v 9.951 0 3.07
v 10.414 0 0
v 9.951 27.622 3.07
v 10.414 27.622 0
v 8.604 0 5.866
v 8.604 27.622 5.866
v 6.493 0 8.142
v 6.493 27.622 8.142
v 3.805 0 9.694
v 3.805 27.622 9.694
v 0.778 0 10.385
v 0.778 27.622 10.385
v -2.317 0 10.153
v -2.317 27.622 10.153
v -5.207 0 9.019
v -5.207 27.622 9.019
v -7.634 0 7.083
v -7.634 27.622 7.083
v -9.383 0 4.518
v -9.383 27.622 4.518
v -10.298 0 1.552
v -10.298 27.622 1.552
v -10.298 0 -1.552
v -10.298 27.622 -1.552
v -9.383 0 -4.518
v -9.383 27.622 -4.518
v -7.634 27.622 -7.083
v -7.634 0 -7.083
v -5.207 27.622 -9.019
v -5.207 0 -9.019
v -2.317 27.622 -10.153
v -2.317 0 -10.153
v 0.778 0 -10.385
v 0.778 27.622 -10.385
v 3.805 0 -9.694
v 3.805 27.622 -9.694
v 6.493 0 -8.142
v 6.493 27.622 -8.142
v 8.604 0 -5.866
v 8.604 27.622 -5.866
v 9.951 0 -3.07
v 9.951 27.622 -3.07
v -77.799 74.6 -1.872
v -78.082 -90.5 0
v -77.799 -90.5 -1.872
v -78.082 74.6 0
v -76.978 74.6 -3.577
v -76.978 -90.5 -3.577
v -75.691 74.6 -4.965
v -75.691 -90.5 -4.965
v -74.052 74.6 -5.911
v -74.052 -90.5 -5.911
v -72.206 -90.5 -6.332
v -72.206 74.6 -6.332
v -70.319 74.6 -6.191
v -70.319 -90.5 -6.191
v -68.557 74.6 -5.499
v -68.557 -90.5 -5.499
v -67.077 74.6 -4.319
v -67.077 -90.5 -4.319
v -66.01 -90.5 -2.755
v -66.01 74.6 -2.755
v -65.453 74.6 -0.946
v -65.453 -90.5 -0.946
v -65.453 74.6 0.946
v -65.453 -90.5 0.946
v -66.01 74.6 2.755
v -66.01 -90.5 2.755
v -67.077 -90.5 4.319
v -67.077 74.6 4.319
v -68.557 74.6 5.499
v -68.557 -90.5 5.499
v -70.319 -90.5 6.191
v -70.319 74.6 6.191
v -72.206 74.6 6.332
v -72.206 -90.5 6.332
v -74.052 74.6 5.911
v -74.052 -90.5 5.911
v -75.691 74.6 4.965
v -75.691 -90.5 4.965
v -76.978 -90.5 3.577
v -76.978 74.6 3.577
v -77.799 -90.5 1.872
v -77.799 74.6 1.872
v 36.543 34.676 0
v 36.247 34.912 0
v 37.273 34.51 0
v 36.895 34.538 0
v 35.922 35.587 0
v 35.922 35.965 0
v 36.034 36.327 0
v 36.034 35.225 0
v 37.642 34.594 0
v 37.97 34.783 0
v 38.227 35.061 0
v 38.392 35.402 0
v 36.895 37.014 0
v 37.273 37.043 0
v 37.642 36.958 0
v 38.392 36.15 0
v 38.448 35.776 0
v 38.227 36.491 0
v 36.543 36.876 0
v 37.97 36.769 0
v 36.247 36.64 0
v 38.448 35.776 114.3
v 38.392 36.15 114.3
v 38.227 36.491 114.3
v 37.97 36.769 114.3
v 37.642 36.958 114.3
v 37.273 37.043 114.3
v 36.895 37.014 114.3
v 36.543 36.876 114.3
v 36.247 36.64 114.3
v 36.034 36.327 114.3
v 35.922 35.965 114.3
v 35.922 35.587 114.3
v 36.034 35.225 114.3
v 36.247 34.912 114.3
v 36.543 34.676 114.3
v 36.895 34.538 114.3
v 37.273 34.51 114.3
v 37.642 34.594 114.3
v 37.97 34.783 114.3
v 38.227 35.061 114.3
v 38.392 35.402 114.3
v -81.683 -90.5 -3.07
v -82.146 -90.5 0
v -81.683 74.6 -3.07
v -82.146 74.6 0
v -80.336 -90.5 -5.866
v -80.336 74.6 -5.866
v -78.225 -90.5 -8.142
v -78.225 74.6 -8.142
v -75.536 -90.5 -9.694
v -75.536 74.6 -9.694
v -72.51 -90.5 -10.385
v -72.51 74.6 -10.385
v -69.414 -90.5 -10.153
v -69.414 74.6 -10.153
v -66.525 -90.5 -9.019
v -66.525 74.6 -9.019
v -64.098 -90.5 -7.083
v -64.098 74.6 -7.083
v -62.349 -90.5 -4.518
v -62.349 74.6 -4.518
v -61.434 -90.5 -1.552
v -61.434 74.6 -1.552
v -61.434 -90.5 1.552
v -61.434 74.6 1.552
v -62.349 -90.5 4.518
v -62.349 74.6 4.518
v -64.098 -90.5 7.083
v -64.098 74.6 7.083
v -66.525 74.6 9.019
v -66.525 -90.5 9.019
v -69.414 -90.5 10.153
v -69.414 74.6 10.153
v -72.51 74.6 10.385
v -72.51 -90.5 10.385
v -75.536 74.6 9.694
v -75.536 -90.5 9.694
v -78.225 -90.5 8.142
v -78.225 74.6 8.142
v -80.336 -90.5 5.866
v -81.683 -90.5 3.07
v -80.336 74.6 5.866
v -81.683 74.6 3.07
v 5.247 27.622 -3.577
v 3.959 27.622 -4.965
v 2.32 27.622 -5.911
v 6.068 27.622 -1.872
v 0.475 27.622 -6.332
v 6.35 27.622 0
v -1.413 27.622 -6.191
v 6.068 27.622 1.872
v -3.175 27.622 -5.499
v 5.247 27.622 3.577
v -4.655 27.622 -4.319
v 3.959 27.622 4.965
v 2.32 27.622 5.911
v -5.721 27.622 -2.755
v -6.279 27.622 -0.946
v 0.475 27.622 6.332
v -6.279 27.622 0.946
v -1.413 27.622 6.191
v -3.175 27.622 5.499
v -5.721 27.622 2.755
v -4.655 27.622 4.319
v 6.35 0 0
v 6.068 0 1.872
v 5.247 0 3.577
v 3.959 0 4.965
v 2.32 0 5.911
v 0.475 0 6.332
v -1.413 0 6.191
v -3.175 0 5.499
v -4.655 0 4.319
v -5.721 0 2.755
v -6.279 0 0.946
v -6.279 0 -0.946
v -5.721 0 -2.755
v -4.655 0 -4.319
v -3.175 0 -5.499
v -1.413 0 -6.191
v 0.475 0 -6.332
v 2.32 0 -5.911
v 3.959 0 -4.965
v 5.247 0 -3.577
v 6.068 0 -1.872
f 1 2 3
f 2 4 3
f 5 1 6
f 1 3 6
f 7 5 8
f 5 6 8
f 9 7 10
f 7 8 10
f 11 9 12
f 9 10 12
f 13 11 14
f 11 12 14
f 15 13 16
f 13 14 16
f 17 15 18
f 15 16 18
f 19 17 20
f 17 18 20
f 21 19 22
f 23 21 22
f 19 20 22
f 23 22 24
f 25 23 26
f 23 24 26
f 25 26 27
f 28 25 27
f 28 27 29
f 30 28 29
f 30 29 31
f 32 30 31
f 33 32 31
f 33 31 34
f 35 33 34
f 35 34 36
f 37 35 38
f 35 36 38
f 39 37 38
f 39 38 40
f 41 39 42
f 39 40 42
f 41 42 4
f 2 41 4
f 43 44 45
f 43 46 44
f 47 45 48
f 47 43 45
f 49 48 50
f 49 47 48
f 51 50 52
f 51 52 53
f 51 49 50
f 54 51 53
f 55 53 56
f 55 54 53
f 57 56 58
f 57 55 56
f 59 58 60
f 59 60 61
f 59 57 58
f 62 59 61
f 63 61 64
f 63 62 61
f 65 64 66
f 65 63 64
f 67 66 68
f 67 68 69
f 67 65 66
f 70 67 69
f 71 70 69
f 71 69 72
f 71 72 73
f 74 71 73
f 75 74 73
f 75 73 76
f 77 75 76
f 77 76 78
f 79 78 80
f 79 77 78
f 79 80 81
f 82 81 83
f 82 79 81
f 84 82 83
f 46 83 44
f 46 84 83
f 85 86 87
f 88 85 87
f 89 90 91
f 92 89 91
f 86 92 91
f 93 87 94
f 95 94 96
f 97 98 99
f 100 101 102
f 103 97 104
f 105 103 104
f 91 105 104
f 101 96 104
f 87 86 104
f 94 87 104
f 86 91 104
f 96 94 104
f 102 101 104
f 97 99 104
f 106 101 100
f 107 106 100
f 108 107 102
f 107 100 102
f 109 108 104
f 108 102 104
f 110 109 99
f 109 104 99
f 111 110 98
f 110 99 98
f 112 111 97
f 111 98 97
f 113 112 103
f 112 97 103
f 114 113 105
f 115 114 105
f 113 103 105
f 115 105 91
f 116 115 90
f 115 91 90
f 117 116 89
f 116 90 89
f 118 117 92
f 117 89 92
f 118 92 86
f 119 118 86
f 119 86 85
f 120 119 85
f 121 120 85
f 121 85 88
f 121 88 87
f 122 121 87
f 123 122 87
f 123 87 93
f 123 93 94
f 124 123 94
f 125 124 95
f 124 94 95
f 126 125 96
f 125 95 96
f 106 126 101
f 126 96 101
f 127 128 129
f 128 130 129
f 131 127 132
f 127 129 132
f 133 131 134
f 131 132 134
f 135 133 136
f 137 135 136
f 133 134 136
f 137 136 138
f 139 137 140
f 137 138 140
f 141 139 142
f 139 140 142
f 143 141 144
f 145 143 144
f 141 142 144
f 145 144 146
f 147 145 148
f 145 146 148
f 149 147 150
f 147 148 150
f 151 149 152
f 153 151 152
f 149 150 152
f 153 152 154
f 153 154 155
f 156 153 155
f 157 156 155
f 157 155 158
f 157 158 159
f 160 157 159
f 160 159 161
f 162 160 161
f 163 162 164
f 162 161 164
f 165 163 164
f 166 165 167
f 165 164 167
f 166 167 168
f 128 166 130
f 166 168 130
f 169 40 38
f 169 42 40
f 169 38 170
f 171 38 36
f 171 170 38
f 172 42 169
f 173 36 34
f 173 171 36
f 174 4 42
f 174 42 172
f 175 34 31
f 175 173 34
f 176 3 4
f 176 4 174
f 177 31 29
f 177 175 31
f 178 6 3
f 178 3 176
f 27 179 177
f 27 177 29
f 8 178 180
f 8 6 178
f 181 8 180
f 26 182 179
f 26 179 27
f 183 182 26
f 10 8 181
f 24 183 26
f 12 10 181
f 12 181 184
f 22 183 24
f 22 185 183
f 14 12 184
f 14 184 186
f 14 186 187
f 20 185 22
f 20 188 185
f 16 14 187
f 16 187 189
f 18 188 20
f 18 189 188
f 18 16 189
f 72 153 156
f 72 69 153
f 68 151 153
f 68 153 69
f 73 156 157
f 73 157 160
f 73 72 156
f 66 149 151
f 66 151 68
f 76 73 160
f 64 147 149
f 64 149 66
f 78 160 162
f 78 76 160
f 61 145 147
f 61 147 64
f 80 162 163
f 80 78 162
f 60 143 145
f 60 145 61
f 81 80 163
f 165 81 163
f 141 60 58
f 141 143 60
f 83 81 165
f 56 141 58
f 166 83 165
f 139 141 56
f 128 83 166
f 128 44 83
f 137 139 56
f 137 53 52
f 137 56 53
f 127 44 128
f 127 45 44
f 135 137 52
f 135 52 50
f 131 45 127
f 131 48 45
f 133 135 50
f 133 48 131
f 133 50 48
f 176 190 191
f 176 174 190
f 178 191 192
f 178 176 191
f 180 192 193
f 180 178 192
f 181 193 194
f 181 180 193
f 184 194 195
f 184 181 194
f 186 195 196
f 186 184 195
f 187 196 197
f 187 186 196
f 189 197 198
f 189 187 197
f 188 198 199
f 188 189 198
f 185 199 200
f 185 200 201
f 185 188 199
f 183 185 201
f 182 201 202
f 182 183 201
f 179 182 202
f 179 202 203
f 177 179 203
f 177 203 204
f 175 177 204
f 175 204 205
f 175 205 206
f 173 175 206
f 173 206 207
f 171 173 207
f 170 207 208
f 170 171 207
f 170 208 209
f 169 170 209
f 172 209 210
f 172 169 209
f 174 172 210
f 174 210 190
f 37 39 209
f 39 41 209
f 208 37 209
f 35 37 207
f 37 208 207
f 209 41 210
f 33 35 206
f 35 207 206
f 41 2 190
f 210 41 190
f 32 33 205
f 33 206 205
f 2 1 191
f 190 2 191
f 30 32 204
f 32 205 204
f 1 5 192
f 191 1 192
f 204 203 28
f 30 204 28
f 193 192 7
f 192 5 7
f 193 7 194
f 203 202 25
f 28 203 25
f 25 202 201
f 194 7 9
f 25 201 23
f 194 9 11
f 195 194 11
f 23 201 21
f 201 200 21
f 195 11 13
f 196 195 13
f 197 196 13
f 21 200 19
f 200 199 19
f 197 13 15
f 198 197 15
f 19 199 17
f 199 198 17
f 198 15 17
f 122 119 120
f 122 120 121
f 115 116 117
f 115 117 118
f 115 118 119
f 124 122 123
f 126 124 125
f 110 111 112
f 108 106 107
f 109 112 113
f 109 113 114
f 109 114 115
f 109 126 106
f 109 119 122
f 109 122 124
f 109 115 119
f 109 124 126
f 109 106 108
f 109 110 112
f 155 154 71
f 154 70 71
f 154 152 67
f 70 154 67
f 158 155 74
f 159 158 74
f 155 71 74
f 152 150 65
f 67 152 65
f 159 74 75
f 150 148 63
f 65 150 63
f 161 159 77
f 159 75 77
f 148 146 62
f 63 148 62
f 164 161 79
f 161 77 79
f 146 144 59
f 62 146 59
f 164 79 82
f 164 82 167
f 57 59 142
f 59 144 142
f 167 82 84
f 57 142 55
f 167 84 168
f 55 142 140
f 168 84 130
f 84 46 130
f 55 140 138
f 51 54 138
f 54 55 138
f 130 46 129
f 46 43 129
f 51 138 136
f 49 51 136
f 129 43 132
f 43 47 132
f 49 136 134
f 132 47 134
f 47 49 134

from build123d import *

# Parameters (mm, degrees)
F0_W     = 4.064
F0_H     = 27.6225
F2_W     = 4.064
F2_H     = 165.1
F4_R     = 1.27
F5_DEPTH = 114.3


with BuildPart() as f1:
    # F0 (on Top) → F1 (revolve)
    with BuildSketch(Plane.XY):
        with Locations((8.382, 13.81125)):
            Rectangle(F0_W, F0_H)
    revolve(axis=Axis((0, 13.81125, 0), (0, -1, 0)))


with BuildPart() as f3:
    # F2 (on Top) → F3 (revolve)
    with BuildSketch(Plane.XY):
        with Locations((-80.1135887269, -7.9502528533)):
            Rectangle(F2_W, F2_H)
    revolve(axis=Axis((-71.7315887269, -7.9502528533, 0), (0, -1, 0)))


with BuildPart() as f5:
    # F4 (on Top) → F5 (new body)
    with BuildSketch(Plane.XY):
        with Locations((37.1779985726, 35.7760712504)):
            Circle(F4_R)
    extrude(amount=F5_DEPTH)


solid = Compound([f1.part, f3.part, f5.part])
